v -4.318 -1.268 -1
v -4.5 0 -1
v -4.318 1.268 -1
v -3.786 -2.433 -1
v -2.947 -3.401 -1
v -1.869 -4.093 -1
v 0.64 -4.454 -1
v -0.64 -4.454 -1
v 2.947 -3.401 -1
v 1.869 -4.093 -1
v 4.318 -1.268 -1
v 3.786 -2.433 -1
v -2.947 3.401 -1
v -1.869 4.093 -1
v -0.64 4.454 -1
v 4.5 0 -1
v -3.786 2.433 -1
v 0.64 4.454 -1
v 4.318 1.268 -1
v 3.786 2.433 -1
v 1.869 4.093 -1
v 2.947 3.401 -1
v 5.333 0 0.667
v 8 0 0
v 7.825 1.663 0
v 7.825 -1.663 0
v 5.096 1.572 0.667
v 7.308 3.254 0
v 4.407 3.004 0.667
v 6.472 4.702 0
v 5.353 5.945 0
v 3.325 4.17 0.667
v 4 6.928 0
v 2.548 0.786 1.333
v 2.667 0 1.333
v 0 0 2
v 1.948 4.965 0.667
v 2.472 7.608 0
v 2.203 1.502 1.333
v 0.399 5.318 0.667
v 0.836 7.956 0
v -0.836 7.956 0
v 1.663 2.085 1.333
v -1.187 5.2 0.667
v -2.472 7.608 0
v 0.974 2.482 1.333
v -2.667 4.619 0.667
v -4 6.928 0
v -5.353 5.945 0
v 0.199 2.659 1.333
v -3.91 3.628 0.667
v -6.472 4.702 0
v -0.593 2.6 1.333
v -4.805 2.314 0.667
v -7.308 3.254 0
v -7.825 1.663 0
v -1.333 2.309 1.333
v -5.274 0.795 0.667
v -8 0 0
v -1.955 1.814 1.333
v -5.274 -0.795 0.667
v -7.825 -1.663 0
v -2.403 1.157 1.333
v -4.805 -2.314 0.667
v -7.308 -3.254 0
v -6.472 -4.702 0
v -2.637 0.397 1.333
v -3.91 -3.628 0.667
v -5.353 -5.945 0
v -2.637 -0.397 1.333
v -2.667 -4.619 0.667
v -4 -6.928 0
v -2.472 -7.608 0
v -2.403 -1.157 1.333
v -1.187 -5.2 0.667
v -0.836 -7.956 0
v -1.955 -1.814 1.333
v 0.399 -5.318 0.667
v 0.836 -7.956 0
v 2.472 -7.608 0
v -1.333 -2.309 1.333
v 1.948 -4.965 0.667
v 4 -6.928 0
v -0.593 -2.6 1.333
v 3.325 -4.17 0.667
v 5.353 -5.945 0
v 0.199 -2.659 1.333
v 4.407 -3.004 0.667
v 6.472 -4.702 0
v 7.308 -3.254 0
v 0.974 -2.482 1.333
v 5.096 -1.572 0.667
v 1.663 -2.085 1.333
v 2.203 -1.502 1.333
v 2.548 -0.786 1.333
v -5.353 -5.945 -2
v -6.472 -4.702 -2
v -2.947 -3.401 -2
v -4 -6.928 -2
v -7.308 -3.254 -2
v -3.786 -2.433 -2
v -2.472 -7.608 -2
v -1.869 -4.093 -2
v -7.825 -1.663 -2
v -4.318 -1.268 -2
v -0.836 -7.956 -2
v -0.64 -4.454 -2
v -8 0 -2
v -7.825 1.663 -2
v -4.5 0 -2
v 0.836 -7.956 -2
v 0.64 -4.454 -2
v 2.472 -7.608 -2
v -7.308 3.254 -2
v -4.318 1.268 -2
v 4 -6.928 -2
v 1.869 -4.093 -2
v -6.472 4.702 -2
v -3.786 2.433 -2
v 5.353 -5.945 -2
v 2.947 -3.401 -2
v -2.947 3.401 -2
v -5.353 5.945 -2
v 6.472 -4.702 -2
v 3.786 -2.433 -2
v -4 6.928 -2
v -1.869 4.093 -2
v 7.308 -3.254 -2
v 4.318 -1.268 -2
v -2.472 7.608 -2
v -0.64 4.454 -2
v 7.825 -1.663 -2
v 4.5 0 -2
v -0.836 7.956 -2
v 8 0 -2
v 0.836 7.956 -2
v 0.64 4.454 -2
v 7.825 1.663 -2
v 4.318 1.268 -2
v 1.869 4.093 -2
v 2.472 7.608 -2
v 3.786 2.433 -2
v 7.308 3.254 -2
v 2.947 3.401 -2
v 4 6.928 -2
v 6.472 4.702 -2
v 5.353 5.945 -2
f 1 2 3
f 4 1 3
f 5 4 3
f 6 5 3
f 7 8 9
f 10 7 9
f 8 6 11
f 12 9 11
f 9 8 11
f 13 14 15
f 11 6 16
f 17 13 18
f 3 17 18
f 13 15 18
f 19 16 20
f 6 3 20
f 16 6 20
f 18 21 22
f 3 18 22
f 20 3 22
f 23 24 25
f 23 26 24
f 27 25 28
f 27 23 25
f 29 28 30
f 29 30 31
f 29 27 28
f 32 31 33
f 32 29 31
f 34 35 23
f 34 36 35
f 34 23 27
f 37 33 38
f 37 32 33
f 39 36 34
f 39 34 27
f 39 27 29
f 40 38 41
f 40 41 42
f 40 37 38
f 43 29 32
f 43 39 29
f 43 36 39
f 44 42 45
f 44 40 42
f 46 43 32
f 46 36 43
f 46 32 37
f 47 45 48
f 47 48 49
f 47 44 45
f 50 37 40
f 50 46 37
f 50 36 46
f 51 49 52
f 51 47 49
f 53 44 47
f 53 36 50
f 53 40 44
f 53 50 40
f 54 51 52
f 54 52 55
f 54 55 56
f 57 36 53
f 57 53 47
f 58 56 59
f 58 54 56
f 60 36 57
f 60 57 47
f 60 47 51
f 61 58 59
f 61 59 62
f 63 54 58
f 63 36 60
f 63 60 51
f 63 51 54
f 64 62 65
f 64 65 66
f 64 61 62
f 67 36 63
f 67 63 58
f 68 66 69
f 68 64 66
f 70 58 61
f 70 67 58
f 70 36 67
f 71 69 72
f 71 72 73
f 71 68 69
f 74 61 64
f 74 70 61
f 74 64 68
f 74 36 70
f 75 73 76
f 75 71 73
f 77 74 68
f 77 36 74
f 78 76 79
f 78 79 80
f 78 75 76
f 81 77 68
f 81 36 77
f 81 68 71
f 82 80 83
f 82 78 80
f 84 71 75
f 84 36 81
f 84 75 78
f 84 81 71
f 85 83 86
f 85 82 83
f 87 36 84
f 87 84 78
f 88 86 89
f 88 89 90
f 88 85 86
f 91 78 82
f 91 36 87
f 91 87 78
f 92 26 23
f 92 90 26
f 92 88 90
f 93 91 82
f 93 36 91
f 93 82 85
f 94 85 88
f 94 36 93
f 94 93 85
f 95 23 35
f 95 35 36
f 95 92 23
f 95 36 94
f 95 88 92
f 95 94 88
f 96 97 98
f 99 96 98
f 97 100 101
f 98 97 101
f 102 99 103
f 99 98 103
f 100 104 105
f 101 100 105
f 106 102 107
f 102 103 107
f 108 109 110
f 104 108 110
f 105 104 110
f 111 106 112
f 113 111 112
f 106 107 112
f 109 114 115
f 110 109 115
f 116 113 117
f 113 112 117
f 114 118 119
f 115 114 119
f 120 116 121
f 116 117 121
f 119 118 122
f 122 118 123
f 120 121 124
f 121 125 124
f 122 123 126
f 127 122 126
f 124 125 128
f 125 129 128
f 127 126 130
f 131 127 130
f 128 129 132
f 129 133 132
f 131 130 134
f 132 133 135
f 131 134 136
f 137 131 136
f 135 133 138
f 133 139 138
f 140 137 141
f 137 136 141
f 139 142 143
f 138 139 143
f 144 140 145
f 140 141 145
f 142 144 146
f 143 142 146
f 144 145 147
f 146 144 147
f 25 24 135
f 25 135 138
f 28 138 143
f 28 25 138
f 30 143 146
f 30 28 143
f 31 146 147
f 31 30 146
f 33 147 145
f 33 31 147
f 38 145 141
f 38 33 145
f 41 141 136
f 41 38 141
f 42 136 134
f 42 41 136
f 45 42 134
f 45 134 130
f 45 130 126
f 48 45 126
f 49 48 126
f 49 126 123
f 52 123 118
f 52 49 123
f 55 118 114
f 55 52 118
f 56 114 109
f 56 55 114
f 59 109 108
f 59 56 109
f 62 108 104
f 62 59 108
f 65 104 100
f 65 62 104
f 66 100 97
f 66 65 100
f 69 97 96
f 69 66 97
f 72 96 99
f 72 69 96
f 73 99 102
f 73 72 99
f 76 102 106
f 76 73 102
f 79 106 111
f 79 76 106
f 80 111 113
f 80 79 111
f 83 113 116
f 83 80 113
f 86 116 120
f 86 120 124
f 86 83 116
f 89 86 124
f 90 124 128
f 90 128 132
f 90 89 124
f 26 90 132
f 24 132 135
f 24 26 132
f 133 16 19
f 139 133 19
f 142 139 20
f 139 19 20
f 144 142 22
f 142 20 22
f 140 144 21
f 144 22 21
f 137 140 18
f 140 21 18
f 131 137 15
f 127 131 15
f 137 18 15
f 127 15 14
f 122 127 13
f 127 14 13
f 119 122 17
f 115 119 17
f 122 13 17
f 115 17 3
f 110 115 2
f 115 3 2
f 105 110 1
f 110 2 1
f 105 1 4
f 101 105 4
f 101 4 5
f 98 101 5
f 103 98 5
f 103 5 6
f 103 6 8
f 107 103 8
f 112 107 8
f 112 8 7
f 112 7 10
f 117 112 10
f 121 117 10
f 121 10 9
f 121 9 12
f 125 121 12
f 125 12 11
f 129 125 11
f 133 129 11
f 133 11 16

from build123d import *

# Parameters (mm, degrees)
F0_R     = 8
F0_R_2   = 4.5
F2_DEPTH = 2
F3_DEPTH = 1


with BuildPart() as f2:
    # F0 (on Top) → F2 (new body)
    with BuildSketch(Plane.XY):
        Circle(F0_R)
        Circle(F0_R_2, mode=Mode.SUBTRACT)
    extrude(amount=-F2_DEPTH)

    # F0 (on Top) → F3 (join)
    with BuildSketch(Plane.XY):
        Circle(F0_R_2)
    extrude(amount=-F3_DEPTH)

    # F1 (on Front) → F4 (revolve)
    with BuildSketch(Plane.XZ):
        Polygon((0, 2), (0, 0), (8, 0), align=None)
    revolve(axis=Axis((0, 0, 1), (0, 0, 1)))


solid = f2.part
